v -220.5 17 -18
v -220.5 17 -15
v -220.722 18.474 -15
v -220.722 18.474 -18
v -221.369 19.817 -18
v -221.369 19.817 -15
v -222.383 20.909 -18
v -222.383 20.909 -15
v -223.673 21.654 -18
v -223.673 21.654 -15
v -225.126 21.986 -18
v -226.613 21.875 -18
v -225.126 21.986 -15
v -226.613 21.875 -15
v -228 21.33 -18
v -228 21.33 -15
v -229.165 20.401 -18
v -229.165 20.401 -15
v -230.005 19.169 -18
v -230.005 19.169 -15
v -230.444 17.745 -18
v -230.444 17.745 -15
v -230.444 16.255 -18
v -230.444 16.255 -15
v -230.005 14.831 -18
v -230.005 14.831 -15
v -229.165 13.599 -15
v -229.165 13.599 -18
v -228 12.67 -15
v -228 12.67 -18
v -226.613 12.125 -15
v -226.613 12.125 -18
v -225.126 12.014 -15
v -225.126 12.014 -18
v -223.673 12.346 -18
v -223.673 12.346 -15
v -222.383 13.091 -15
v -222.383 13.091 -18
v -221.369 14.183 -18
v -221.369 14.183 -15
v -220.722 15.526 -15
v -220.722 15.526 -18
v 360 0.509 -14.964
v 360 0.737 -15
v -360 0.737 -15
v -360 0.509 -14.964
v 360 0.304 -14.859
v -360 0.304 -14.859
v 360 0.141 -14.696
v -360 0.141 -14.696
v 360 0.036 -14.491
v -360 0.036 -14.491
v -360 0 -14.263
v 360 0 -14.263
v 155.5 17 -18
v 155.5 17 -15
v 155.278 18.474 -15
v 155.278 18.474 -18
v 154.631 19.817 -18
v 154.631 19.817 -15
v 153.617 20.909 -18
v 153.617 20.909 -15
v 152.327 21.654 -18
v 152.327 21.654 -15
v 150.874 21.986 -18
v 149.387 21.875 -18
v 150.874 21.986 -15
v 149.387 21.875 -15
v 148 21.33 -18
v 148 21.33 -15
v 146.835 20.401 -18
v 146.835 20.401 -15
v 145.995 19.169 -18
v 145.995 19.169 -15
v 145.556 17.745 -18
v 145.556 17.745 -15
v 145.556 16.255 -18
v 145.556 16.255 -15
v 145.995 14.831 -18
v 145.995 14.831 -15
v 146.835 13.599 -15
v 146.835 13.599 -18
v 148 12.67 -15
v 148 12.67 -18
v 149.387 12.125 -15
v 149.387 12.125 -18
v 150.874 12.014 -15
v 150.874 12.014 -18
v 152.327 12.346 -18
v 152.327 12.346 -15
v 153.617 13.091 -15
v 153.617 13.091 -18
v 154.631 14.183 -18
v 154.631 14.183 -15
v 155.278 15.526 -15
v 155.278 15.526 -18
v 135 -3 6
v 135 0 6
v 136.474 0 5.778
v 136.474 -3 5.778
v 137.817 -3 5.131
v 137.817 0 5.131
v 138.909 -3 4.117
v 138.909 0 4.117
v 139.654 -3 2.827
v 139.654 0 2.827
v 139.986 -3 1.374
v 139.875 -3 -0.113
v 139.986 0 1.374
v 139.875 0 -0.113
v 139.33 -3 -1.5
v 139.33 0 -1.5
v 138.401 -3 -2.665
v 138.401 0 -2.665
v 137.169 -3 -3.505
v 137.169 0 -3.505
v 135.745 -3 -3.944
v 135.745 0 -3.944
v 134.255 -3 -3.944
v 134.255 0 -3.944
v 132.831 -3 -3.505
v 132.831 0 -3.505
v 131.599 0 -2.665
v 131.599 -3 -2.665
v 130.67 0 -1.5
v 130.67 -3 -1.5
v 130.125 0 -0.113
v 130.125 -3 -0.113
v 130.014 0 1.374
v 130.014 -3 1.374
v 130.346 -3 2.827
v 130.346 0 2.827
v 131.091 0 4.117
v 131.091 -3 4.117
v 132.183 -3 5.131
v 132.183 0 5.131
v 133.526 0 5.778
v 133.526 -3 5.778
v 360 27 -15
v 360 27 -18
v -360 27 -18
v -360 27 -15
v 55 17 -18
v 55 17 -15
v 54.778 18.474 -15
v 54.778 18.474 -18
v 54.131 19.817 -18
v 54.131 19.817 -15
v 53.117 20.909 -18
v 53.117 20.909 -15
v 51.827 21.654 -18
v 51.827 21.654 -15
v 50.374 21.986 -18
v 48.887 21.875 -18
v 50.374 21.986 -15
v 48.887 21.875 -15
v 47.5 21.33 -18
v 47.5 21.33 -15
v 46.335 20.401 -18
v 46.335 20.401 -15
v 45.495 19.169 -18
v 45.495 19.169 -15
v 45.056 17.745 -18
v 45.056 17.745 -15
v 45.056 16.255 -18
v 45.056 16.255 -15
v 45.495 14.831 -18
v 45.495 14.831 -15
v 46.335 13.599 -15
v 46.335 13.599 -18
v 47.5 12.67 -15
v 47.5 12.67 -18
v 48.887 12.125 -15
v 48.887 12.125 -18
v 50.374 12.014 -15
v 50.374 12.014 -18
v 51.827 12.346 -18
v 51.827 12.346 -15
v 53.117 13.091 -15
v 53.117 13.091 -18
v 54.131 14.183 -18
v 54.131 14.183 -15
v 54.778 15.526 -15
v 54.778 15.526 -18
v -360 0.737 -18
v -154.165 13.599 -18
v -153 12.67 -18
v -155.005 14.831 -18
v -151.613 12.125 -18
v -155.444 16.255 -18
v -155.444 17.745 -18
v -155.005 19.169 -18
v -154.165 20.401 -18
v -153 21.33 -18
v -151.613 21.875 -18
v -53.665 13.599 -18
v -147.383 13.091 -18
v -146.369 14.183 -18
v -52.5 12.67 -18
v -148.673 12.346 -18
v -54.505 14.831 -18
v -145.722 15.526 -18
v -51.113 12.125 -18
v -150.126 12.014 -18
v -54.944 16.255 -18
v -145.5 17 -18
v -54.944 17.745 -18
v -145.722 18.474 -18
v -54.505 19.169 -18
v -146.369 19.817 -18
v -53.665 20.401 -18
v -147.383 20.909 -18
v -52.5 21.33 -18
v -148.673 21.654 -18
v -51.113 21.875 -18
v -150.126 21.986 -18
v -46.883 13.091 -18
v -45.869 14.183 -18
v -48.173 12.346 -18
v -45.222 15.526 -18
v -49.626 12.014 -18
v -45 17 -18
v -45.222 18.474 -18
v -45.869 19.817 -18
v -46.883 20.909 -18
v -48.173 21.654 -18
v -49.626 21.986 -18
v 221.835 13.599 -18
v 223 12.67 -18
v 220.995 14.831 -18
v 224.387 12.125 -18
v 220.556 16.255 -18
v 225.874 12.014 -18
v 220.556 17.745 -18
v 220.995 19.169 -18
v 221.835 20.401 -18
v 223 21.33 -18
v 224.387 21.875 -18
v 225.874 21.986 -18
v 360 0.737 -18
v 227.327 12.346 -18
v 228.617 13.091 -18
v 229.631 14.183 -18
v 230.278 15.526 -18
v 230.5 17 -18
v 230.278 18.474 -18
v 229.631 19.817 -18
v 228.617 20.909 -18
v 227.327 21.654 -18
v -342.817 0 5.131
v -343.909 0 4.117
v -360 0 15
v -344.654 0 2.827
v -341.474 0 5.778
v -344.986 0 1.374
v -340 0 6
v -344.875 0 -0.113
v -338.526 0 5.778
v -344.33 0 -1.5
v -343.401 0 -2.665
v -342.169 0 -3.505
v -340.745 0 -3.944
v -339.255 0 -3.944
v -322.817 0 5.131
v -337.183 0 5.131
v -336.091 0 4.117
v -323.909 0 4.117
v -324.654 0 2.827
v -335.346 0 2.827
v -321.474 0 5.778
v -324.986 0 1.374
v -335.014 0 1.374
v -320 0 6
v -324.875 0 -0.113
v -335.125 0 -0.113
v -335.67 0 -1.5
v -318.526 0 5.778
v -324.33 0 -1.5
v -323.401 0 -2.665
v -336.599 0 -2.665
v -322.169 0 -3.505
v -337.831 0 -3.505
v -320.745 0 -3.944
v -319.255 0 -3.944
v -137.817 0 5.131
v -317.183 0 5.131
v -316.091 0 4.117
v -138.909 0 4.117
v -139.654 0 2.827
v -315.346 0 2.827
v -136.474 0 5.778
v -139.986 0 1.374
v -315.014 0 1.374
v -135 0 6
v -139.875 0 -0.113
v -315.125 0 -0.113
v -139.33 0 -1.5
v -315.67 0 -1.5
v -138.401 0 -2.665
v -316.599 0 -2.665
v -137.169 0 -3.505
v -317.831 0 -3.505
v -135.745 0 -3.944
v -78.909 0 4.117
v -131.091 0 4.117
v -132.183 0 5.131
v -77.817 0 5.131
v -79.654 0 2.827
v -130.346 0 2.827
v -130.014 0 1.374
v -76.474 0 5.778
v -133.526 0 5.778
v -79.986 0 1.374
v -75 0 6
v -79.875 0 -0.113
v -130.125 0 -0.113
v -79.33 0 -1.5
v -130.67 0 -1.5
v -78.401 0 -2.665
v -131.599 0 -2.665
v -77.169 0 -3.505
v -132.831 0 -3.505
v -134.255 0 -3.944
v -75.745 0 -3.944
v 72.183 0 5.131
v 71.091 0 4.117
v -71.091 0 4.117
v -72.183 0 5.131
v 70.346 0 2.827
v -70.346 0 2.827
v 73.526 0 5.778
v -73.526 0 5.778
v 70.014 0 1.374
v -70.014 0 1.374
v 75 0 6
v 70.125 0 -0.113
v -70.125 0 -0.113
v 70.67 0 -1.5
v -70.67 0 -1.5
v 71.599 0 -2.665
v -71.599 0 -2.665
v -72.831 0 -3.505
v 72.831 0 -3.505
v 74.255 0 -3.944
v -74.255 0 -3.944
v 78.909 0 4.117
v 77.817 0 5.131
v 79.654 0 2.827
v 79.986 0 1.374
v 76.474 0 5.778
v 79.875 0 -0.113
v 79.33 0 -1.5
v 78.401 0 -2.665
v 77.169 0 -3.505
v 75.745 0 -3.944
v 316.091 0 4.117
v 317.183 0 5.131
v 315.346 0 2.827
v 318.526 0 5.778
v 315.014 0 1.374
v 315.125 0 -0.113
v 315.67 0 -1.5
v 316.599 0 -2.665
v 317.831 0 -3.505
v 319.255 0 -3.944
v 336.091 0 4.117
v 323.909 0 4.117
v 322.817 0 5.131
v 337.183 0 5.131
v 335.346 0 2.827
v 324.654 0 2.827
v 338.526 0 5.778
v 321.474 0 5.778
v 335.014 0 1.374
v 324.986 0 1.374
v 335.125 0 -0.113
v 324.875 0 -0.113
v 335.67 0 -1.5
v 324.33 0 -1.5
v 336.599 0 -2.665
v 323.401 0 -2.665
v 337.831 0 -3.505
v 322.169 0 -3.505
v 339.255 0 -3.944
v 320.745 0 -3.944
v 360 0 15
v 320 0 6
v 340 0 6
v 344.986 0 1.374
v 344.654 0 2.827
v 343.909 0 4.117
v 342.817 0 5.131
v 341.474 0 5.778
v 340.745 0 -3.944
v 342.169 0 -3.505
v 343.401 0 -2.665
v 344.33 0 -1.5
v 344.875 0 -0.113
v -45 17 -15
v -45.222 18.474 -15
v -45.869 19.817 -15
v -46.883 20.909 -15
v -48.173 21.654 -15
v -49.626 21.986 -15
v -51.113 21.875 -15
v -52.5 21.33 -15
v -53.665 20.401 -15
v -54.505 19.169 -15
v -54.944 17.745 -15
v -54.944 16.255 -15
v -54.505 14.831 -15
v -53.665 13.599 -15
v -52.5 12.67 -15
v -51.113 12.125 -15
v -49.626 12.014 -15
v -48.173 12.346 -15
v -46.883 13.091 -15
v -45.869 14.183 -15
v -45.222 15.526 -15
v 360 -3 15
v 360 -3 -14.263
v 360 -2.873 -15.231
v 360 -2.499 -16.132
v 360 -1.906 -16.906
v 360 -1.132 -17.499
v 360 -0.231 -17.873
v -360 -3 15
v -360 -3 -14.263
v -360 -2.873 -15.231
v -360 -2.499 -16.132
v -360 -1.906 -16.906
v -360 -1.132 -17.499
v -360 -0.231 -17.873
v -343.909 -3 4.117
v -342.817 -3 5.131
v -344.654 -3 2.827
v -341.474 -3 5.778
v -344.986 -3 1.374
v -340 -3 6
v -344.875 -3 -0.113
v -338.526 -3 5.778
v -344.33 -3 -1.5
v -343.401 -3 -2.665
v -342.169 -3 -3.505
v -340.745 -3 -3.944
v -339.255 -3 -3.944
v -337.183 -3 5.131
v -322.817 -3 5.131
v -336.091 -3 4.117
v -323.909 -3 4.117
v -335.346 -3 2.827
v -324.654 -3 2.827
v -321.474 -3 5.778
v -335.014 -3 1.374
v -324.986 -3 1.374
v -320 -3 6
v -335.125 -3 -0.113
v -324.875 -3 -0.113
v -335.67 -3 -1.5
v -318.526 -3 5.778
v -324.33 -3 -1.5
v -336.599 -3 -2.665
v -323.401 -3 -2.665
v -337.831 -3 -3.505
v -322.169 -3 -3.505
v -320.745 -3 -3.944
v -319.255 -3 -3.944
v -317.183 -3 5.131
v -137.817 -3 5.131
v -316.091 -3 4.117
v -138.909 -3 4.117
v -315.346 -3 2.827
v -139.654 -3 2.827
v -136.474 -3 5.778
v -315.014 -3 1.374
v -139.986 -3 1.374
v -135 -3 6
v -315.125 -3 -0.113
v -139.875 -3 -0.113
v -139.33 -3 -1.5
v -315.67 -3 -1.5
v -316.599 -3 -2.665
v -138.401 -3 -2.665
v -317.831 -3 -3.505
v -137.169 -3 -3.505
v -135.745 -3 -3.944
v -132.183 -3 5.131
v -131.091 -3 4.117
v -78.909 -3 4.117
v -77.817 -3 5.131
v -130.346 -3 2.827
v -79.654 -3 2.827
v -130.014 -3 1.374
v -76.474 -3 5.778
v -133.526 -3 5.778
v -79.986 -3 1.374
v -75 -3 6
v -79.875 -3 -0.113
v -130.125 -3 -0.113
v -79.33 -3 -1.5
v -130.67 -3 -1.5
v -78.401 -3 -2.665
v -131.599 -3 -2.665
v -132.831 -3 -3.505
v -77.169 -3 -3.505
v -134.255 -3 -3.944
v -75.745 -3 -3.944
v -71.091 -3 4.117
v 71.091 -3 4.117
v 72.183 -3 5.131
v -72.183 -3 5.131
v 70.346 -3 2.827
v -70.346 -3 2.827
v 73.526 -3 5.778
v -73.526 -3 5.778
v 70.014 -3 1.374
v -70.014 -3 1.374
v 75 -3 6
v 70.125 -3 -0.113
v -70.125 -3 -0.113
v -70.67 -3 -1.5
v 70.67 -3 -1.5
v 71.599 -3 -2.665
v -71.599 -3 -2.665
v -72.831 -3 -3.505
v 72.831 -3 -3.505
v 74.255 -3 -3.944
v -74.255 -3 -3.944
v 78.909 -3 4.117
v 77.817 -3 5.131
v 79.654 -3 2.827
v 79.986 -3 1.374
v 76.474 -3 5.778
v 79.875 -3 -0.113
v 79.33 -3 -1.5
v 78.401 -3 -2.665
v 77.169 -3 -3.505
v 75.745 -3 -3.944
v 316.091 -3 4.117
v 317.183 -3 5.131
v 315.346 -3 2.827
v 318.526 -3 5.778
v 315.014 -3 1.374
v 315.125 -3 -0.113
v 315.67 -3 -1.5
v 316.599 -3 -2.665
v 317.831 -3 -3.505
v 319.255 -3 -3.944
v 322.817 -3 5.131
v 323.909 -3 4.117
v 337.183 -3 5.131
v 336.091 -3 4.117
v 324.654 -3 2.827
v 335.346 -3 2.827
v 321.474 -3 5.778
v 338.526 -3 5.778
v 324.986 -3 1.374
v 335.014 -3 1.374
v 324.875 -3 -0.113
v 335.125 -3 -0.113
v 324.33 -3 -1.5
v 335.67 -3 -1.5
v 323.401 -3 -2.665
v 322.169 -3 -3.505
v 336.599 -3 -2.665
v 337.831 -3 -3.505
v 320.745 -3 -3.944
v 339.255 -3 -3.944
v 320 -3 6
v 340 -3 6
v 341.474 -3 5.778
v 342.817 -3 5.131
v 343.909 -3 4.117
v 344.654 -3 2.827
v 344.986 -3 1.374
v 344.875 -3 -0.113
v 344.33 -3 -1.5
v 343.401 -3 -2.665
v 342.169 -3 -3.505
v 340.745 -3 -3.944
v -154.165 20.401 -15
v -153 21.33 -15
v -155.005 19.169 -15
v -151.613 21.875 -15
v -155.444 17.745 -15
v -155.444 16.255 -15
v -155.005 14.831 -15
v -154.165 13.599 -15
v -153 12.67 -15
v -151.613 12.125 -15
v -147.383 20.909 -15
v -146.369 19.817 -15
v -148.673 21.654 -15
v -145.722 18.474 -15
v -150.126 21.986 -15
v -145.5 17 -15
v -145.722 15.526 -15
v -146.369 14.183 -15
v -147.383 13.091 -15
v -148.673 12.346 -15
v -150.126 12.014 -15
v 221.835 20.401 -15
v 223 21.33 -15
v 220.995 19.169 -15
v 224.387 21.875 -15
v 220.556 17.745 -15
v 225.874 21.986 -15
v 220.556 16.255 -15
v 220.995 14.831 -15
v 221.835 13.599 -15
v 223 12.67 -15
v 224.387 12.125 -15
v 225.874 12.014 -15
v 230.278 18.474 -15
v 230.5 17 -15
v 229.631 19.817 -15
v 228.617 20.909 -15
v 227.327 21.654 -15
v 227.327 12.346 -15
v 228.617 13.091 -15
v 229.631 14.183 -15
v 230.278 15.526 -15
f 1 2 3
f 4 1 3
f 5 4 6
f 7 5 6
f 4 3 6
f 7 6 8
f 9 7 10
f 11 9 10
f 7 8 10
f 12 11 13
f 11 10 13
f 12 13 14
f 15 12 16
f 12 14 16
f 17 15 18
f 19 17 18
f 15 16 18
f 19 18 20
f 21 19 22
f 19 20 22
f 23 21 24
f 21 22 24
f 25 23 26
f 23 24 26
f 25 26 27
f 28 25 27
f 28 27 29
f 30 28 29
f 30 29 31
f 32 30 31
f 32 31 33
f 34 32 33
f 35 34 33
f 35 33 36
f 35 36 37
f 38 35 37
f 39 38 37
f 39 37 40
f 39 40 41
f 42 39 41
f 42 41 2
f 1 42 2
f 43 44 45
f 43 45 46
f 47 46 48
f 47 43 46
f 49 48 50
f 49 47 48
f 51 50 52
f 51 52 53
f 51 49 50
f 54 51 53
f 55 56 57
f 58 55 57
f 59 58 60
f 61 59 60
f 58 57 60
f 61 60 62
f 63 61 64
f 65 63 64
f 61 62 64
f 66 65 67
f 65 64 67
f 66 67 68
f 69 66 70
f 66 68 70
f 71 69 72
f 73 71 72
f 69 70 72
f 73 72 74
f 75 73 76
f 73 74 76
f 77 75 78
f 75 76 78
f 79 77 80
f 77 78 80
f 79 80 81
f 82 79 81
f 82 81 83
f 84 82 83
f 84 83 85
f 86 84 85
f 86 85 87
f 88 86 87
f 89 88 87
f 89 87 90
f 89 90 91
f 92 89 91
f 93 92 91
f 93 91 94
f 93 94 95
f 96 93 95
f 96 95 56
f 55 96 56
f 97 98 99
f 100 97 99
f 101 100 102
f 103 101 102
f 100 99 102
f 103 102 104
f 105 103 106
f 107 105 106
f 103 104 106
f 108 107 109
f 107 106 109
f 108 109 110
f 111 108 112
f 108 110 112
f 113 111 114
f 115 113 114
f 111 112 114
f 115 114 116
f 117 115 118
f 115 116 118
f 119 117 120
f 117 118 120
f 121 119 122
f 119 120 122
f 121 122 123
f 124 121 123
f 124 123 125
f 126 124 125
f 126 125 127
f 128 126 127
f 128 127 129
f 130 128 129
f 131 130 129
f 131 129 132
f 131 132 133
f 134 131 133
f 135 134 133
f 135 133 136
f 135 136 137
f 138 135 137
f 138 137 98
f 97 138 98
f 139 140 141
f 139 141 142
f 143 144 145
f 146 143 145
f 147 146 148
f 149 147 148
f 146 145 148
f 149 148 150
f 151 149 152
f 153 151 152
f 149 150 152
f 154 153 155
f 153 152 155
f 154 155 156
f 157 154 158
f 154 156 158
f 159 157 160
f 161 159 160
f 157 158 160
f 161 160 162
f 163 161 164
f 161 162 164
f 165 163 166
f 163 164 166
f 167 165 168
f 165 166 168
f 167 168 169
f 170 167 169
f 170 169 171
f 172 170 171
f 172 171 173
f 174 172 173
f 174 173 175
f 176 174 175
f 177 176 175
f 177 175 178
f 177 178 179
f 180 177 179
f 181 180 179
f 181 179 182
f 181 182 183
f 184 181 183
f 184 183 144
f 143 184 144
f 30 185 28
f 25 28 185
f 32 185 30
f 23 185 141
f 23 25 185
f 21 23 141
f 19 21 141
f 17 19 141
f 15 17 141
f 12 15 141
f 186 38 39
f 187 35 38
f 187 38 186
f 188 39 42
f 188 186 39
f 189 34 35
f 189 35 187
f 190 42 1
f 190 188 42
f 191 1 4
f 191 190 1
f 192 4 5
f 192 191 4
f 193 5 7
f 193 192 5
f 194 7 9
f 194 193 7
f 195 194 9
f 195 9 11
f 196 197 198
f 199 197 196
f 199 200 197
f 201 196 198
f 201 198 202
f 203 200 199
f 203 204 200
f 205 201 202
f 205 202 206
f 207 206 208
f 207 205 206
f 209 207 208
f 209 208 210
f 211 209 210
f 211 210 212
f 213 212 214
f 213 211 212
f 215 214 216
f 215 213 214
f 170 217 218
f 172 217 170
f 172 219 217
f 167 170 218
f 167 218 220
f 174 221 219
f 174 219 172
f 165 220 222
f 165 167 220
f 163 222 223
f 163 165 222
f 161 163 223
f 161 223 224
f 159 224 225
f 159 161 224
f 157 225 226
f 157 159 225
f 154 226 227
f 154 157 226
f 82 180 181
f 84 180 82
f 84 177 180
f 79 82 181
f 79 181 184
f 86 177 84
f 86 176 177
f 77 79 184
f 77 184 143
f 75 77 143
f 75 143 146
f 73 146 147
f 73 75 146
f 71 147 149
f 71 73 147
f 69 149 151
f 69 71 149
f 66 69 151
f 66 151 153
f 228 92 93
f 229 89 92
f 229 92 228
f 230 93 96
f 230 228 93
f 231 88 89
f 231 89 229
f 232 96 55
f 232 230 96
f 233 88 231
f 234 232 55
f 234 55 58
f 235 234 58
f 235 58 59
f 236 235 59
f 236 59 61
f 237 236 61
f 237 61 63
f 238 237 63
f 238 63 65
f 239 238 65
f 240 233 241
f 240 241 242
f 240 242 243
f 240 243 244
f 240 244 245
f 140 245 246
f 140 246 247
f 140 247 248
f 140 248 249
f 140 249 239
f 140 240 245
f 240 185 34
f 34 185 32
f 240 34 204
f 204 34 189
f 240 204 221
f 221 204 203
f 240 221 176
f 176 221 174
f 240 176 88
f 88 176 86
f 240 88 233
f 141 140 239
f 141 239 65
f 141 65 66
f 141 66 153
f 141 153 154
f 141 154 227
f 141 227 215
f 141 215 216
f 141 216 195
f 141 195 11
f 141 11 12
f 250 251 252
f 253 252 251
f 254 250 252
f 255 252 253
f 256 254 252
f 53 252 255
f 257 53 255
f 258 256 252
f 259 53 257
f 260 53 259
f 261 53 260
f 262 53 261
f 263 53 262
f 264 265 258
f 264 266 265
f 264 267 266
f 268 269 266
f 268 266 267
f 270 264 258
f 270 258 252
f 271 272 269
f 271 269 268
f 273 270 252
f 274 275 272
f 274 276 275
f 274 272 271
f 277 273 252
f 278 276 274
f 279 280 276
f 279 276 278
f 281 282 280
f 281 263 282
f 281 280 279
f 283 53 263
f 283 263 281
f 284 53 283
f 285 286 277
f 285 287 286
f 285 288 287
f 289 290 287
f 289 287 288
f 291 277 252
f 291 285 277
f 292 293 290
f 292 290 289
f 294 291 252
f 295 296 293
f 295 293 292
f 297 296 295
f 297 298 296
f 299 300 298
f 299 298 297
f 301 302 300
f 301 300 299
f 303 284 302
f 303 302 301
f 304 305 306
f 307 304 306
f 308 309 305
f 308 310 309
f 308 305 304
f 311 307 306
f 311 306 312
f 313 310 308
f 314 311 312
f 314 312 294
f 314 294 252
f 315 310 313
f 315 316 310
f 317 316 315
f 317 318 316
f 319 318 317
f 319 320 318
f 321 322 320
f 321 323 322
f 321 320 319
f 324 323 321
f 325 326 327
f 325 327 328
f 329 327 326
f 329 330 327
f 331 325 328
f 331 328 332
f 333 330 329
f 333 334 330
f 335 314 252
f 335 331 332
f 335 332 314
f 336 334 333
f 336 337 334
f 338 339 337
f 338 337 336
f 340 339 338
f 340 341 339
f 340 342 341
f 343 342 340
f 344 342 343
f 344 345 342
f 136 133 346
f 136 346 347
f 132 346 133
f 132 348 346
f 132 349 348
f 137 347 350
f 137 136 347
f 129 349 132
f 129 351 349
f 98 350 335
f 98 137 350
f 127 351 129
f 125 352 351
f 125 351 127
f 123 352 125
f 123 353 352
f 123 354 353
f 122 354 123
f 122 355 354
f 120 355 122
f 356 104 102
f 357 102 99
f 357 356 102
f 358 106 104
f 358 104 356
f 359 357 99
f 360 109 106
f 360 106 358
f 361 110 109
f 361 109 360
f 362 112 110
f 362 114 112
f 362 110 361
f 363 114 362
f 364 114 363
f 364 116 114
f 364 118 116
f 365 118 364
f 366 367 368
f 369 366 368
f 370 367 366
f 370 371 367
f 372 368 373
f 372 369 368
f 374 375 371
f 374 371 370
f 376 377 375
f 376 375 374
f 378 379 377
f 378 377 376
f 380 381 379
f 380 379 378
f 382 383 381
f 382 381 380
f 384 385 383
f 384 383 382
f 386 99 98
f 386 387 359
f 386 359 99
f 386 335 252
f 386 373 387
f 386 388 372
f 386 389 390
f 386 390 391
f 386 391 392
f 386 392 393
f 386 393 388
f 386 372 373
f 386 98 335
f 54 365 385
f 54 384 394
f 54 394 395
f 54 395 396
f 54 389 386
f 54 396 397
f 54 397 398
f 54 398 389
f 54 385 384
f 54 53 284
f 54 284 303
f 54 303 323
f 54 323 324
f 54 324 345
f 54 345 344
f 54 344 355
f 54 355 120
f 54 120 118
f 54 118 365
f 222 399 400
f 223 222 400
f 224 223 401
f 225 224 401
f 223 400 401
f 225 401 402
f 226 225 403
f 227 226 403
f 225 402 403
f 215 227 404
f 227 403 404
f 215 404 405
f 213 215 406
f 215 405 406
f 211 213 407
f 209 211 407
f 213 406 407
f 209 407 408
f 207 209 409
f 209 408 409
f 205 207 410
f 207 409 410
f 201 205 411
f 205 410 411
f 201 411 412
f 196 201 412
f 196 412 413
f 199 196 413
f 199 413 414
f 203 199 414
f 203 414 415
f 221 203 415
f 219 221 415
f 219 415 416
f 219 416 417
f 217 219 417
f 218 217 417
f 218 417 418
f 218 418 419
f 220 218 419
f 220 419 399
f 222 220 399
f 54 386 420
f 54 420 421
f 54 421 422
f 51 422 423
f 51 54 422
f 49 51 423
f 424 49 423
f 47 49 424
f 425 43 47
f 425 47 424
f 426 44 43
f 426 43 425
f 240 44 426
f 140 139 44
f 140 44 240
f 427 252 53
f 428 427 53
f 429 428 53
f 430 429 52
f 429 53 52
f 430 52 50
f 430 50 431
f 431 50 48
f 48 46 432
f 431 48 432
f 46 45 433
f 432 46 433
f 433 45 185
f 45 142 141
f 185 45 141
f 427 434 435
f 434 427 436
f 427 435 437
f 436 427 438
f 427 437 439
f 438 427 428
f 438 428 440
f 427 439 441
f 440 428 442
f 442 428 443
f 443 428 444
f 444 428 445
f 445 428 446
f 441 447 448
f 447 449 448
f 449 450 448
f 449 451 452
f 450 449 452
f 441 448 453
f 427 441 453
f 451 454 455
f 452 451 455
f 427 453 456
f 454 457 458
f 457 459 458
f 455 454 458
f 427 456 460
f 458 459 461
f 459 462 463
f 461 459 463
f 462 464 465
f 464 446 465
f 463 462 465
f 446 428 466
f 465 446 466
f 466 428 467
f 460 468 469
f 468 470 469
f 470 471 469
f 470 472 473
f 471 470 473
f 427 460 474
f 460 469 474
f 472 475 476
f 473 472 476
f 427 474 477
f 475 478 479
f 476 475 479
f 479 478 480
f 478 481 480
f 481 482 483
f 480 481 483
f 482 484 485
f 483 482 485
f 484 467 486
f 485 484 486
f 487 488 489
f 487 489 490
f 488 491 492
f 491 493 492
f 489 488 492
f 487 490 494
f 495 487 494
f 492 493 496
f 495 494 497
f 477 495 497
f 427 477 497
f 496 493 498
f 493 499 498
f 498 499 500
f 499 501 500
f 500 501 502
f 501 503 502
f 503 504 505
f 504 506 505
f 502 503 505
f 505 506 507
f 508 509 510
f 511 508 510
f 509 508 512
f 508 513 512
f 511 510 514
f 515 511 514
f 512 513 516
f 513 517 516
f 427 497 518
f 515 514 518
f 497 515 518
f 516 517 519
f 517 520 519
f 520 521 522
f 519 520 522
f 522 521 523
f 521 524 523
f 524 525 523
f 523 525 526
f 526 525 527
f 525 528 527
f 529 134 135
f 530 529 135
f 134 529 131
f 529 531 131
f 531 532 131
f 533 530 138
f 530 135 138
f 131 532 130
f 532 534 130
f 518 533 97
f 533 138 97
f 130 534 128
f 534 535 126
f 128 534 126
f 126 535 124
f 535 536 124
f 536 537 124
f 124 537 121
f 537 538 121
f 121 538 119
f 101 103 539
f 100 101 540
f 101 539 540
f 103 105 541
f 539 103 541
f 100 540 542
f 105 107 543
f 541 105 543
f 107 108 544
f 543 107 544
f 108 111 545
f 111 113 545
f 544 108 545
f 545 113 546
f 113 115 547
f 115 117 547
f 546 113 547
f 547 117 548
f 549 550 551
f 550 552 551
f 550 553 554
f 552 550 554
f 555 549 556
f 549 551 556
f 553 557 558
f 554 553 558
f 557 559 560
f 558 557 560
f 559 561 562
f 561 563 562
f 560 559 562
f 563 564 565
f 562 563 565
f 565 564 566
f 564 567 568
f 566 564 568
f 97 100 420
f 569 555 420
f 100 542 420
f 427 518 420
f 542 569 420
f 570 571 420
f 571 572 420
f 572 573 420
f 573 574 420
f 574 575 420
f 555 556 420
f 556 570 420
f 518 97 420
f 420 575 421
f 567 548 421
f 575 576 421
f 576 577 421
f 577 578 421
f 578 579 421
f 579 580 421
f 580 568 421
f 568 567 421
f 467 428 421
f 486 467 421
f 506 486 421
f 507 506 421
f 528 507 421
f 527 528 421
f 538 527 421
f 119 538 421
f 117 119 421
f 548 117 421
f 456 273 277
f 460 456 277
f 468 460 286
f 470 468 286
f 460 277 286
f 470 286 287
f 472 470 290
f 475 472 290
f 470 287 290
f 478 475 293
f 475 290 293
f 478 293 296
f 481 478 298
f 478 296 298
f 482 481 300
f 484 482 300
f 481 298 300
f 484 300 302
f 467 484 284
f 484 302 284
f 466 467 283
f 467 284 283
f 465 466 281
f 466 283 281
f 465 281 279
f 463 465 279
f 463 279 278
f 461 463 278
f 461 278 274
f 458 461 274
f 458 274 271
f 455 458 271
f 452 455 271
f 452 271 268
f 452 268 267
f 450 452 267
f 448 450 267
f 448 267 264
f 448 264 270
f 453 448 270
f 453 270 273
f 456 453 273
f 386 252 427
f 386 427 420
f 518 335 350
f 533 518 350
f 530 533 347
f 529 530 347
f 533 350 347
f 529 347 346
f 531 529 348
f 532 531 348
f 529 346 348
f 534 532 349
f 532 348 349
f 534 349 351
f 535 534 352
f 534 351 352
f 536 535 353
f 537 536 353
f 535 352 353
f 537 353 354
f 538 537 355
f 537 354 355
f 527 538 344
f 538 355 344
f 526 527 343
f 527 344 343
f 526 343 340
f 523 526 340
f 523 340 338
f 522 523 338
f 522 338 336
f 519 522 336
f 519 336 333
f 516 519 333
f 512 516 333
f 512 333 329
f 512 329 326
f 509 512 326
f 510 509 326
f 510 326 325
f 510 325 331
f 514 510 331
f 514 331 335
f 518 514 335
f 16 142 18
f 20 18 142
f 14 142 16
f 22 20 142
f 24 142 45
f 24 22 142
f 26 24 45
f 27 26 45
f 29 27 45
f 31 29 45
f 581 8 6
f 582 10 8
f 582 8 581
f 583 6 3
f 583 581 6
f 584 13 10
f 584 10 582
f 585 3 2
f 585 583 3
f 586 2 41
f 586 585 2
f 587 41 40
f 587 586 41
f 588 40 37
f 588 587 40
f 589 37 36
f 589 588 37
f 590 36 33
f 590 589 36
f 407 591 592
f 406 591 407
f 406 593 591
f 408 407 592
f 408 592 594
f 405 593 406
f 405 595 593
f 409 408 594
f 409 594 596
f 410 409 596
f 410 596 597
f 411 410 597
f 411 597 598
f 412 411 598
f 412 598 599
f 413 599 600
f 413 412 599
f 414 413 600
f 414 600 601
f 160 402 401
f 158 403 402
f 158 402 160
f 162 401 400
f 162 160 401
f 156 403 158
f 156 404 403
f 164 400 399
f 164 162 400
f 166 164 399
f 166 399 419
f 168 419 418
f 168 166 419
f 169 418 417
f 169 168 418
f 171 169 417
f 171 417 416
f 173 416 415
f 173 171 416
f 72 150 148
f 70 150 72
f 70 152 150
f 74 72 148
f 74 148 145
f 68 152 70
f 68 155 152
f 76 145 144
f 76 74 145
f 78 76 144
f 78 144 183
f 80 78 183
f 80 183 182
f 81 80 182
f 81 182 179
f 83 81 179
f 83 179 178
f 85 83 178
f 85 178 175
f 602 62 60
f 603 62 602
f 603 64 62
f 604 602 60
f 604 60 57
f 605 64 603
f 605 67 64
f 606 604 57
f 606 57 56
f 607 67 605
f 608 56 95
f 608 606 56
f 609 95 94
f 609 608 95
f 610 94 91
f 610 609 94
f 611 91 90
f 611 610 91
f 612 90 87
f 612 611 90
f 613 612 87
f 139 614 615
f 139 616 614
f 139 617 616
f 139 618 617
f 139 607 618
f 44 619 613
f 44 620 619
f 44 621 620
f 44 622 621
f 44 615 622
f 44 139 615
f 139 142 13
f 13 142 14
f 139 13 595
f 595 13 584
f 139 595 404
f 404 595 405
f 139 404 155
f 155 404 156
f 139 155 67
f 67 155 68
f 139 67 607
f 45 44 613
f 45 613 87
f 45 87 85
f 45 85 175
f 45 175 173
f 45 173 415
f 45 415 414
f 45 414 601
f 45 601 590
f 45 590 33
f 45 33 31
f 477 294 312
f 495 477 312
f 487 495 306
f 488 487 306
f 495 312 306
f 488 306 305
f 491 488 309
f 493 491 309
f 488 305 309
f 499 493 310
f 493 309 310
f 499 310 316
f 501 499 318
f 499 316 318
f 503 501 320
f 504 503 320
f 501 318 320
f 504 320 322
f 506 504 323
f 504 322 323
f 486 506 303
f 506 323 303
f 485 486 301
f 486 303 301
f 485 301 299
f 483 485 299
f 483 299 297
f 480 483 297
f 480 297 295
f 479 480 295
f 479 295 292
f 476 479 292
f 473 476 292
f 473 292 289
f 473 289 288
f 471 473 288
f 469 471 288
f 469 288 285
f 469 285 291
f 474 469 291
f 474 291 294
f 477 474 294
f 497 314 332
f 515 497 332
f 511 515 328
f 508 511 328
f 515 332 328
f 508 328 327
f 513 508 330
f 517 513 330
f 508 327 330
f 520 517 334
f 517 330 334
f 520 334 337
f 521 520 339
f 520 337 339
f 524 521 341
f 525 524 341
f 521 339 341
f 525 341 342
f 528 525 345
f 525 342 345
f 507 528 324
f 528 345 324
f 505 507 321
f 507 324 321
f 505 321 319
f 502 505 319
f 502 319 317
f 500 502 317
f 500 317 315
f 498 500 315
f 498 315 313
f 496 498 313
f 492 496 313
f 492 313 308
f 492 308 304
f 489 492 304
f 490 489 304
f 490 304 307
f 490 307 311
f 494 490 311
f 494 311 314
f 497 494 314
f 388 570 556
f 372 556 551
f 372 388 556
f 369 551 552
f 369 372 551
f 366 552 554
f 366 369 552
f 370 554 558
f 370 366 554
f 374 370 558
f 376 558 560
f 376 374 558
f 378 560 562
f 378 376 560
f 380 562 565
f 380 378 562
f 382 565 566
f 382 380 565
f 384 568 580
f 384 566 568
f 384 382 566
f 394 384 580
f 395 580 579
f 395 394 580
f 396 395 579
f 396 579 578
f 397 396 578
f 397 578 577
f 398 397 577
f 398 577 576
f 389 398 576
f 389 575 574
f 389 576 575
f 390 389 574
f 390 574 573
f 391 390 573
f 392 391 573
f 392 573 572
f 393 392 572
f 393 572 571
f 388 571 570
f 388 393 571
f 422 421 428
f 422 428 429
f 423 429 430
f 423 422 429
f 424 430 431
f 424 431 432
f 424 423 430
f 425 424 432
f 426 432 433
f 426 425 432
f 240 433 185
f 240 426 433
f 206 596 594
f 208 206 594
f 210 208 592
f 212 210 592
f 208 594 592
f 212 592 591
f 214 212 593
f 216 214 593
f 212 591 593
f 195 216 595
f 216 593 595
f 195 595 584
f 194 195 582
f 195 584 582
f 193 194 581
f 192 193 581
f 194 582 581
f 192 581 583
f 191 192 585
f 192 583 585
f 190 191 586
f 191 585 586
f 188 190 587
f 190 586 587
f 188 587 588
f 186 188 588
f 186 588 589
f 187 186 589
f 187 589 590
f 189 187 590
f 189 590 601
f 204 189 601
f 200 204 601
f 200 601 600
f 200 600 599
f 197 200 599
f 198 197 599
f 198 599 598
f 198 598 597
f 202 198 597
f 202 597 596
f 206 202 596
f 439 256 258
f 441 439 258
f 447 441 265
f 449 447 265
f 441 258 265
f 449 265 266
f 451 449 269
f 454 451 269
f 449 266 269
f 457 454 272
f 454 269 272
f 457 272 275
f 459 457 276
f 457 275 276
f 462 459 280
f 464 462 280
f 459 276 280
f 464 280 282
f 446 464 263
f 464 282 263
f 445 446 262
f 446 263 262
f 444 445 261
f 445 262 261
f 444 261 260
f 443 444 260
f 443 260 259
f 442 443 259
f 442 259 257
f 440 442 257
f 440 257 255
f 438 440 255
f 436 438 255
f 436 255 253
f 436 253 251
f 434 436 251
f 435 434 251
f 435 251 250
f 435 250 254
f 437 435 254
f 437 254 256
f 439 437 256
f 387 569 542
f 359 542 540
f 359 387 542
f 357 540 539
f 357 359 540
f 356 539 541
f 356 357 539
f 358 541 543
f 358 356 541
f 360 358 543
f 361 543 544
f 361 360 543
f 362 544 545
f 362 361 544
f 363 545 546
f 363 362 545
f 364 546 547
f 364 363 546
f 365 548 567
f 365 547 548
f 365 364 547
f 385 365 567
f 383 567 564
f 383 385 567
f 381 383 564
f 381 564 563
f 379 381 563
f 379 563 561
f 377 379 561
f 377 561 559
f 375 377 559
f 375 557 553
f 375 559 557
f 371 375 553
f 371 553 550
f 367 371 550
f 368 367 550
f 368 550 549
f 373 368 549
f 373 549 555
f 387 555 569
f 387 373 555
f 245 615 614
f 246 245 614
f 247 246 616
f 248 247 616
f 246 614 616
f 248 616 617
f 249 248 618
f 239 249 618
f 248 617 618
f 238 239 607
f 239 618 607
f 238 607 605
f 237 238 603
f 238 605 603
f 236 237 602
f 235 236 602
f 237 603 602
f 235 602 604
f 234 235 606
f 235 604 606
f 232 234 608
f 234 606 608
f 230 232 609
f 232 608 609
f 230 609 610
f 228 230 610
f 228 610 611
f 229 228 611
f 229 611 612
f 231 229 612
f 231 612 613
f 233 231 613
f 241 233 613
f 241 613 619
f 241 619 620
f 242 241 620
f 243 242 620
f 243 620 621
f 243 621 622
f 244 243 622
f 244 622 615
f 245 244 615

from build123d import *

# Parameters (mm, degrees)
SKETCH3_W                    = 720
SKETCH3_H                    = 30
BASE_FLANGE1_DEPTH           = 3
EDGE_FLANGE1_STRIP_W         = 13.4732
EDGE_FLANGE1_STRIP_H         = 3
EDGE_FLANGE1_STRIP_CUT_DEPTH = 720
EDGE_FLANGE1_DEPTH           = 720
SKETCH10_R                   = 5
CUT_EXTRUDE2_DEPTH           = 10
SKETCH11_R                   = 5
CUT_EXTRUDE3_DEPTH           = 10
SKETCH12_R                   = 5
CUT_EXTRUDE4_DEPTH           = 10


# Sheet-metal steps are written as plain solids
with BuildPart() as part:
    # Sketch3 → Base-Flange1 (new body)
    with BuildSketch(Plane(origin=(0, 0, 0), x_dir=(1, 0, 0), z_dir=(0, 1, 0))):
        Rectangle(SKETCH3_W, SKETCH3_H)
    extrude(amount=-BASE_FLANGE1_DEPTH)

    # Edge-Flange1 strip (across the edge) → Edge-Flange1 strip cut (cut)
    with BuildSketch(Plane(origin=(360, 0, -15), x_dir=(0, 0, 1), z_dir=(-1, 0, 0))):
        with Locations((-6, -1.5)):
            Rectangle(EDGE_FLANGE1_STRIP_W, EDGE_FLANGE1_STRIP_H)
    extrude(amount=EDGE_FLANGE1_STRIP_CUT_DEPTH, mode=Mode.SUBTRACT)

    # Edge-Flange1 section (across the edge) → Edge-Flange1 (add)
    with BuildSketch(Plane(origin=(360, 0, -15), x_dir=(0, 0, 1), z_dir=(-1, 0, 0))):
        with BuildLine():
            Line((-3, 0.7366), (-3, 27))
            Line((-3, 27), (0, 27))
            Line((0, 27), (0, 0.7366))
            ThreePointArc((0, 0.7366), (0.215745145, 0.215745145), (0.7366, 0))
            Line((0.7366, 0), (0.7366, -3))
            ThreePointArc((0.7366, -3), (-1.905575199, -1.905575199), (-3, 0.7366))
        make_face()
    extrude(amount=EDGE_FLANGE1_DEPTH)

    # Sketch10 → Cut-Extrude2 (cut)
    with BuildSketch(Plane(origin=(0, 0, 0), x_dir=(1, 0, 0), z_dir=(0, 1, 0))):
        with Locations(Location((-340, -1, 0), (0, 0, 270))):
            Circle(SKETCH10_R)
        with Locations(Location((-320, -1, 0), (0, 0, 270))):
            Circle(SKETCH10_R)
    cut_extrude2 = extrude(amount=-CUT_EXTRUDE2_DEPTH, mode=Mode.SUBTRACT)

    # Mirror1: Cut-Extrude2 across plane
    add(cut_extrude2.mirror(Plane(origin=(0, 0, 0), x_dir=(0, 0, 1), z_dir=(1, 0, 0))), mode=Mode.SUBTRACT)

    # Sketch11 → Cut-Extrude3 (cut)
    with BuildSketch(Plane.XY.offset(-15)):
        with Locations((225.5, 17)):
            Circle(SKETCH11_R)
        with Locations((-225.5, 17)):
            Circle(SKETCH11_R)
        with Locations((-150.5, 17)):
            Circle(SKETCH11_R)
        with Locations((150.5, 17)):
            Circle(SKETCH11_R)
        with Locations((50, 17)):
            Circle(SKETCH11_R)
        with Locations((-50, 17)):
            Circle(SKETCH11_R)
    extrude(amount=-CUT_EXTRUDE3_DEPTH, mode=Mode.SUBTRACT)

    # Sketch12 → Cut-Extrude4 (cut)
    with BuildSketch(Plane(origin=(0, 0, 0), x_dir=(1, 0, 0), z_dir=(0, 1, 0))):
        with Locations(Location((-75, -1, 0), (0, 0, 270))):
            Circle(SKETCH12_R)
        with Locations(Location((75, -1, 0), (0, 0, 270))):
            Circle(SKETCH12_R)
        with Locations(Location((135, -1, 0), (0, 0, 270))):
            Circle(SKETCH12_R)
        with Locations(Location((-135, -1, 0), (0, 0, 270))):
            Circle(SKETCH12_R)
    extrude(amount=-CUT_EXTRUDE4_DEPTH, mode=Mode.SUBTRACT)


solid = part.part
